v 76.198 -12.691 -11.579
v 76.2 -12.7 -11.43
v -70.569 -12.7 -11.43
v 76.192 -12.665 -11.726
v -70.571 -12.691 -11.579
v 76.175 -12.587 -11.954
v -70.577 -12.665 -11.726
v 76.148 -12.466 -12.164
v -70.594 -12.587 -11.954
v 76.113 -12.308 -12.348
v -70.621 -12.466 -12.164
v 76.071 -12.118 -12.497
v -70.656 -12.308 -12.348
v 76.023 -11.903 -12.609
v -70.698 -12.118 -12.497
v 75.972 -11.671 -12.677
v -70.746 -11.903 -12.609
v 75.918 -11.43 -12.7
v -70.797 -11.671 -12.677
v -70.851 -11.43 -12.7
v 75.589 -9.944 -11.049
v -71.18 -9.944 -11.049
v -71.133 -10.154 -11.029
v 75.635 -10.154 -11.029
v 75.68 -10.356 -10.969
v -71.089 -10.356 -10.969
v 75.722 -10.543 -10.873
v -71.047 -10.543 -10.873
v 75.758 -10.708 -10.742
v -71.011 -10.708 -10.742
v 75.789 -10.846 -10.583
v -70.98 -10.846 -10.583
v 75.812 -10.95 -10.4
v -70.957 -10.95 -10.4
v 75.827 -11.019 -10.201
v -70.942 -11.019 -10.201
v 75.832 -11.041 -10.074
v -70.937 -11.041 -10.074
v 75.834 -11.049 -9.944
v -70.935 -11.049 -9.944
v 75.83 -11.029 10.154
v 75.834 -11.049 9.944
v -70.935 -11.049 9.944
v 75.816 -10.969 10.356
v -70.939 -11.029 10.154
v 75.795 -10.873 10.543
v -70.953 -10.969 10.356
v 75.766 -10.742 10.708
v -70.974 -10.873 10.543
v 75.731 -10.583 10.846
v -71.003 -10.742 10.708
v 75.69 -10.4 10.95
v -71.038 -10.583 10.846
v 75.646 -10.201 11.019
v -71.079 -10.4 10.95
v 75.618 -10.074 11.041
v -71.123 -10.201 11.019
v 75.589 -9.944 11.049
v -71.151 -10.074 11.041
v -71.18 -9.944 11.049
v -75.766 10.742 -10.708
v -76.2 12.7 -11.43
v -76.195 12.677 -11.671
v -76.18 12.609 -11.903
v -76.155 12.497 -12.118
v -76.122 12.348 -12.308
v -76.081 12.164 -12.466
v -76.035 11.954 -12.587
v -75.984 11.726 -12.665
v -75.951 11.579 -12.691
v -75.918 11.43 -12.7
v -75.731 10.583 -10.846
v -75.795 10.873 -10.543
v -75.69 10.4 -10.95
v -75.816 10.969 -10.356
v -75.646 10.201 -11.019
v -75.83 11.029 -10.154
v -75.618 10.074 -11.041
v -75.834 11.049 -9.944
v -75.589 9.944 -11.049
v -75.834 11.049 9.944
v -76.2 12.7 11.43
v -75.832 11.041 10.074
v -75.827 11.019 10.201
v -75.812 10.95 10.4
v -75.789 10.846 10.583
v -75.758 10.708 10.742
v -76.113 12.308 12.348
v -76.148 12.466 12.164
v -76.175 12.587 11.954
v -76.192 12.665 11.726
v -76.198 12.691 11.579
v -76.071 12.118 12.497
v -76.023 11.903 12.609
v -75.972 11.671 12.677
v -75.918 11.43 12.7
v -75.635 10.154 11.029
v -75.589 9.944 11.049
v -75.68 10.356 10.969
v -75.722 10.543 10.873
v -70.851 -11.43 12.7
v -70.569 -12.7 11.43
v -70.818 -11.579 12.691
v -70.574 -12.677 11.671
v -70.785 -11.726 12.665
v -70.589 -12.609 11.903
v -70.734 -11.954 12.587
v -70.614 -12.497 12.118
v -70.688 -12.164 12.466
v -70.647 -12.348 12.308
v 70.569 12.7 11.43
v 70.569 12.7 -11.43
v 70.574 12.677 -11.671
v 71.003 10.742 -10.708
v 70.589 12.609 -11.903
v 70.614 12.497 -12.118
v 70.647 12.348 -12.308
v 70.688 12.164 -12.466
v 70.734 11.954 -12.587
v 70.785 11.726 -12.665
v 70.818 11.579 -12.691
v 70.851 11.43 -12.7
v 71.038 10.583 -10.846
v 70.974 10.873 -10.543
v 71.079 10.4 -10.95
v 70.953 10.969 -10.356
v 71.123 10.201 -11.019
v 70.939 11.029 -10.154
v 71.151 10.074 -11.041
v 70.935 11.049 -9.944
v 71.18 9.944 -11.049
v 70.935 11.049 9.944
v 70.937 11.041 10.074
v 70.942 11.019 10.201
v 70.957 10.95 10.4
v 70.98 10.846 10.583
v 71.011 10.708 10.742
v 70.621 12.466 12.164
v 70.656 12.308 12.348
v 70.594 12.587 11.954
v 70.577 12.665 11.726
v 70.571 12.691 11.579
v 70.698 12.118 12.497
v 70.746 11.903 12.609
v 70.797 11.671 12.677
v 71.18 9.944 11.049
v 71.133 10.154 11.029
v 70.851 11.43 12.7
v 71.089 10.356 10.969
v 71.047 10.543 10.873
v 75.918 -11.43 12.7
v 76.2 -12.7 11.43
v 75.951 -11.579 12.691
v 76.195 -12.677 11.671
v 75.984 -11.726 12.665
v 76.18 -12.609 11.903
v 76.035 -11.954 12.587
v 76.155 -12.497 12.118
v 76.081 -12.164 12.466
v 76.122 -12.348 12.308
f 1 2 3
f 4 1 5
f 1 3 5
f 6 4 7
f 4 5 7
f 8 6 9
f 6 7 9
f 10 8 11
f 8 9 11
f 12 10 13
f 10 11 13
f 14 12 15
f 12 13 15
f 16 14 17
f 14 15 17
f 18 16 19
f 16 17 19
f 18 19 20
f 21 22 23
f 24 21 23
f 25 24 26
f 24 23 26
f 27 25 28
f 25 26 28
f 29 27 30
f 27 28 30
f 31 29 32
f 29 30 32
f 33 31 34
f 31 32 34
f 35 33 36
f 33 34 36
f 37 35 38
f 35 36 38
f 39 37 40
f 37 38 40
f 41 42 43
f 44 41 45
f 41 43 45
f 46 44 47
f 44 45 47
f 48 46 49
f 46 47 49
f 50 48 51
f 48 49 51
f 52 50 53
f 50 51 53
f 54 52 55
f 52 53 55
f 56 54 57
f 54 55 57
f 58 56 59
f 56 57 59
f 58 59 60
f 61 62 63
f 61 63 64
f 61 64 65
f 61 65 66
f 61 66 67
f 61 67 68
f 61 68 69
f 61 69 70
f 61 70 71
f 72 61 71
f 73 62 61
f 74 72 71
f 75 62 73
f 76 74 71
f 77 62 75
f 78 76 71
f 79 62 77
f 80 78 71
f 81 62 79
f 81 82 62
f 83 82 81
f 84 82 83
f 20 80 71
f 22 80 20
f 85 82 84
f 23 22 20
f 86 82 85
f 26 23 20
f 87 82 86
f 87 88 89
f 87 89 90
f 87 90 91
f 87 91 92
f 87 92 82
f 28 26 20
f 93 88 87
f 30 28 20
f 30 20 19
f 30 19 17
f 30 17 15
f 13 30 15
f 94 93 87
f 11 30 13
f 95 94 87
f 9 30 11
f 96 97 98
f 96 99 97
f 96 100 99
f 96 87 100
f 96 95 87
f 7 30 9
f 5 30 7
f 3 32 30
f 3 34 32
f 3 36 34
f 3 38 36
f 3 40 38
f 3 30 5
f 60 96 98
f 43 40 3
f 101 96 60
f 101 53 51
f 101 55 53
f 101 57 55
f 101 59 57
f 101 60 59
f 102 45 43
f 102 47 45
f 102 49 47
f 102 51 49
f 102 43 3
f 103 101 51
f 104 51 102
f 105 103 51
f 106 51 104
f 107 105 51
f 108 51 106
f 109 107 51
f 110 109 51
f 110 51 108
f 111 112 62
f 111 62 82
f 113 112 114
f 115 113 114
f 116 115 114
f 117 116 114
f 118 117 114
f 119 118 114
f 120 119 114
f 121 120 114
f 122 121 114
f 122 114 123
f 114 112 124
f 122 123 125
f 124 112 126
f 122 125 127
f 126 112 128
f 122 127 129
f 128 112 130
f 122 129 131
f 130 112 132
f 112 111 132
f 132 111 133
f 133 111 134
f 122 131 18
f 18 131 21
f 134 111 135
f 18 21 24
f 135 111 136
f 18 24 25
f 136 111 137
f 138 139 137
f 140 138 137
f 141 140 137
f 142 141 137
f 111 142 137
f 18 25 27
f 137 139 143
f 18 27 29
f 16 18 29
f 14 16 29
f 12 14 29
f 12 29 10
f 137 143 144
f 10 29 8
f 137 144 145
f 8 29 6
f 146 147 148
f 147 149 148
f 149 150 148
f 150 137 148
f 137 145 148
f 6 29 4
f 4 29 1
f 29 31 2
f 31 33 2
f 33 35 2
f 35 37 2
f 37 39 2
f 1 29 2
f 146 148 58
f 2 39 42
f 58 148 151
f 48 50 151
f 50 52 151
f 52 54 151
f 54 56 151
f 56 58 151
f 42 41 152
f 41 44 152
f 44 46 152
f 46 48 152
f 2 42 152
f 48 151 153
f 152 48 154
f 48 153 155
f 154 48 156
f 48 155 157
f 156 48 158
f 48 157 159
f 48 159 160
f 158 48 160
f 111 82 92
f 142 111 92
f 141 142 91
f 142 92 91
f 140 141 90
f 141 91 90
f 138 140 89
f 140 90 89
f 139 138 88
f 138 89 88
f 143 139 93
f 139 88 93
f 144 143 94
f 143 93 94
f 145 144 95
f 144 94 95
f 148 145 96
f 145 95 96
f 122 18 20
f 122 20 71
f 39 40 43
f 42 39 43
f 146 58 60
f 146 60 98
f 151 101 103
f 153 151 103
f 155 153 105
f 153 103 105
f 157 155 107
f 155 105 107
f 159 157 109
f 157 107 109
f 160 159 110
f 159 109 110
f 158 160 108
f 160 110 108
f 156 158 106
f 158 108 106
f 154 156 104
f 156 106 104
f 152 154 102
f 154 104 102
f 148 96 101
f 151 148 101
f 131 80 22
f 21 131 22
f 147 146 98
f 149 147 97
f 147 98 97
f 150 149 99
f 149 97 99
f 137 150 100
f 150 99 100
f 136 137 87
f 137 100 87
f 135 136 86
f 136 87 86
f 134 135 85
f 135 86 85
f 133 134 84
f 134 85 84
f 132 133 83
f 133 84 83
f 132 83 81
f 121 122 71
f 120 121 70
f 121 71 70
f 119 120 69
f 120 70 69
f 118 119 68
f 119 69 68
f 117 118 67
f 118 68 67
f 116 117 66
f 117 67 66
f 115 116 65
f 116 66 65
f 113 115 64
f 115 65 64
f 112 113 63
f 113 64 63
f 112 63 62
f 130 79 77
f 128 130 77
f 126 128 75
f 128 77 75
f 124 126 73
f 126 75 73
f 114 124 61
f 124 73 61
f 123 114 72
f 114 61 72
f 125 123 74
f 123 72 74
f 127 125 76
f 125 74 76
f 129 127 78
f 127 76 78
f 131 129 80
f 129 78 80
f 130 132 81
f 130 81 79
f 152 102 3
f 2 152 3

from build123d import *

# Parameters (mm, degrees)
BOSS_EXTRUDE1_DEPTH      = 76.2
BOSS_EXTRUDE1_DEPTH_BACK = 76.2
CUT_EXTRUDE1_DEPTH       = 82.319677815


with BuildPart() as part:
    # Sketch4 → Boss-Extrude1 (new, two sides: drawn at the far end of the back side and taken through both)
    with BuildSketch(Plane(origin=(0, 0, 0), x_dir=(0, 0, -1), z_dir=(1, 0, 0)).offset(-BOSS_EXTRUDE1_DEPTH_BACK)):
        with BuildLine():
            Line((12.7, -11.43), (12.7, 11.43))
            ThreePointArc((12.7, 11.43), (12.328025612, 12.328025612), (11.43, 12.7))
            Line((11.43, 12.7), (-11.43, 12.7))
            ThreePointArc((-11.43, 12.7), (-12.328025612, 12.328025612), (-12.7, 11.43))
            Line((-12.7, 11.43), (-12.7, -11.43))
            ThreePointArc((-12.7, -11.43), (-12.328025612, -12.328025612), (-11.43, -12.7))
            Line((-11.43, -12.7), (11.43, -12.7))
            ThreePointArc((11.43, -12.7), (12.328025612, -12.328025612), (12.7, -11.43))
        make_face()
        with BuildLine():
            Line((11.049, 9.9441), (11.049, -9.9441))
            ThreePointArc((11.049, -9.9441), (10.725382283, -10.725382283), (9.9441, -11.049))
            Line((9.9441, -11.049), (-9.9441, -11.049))
            ThreePointArc((-9.9441, -11.049), (-10.725382283, -10.725382283), (-11.049, -9.9441))
            Line((-11.049, -9.9441), (-11.049, 9.9441))
            ThreePointArc((-11.049, 9.9441), (-10.725382283, 10.725382283), (-9.9441, 11.049))
            Line((-9.9441, 11.049), (9.9441, 11.049))
            ThreePointArc((9.9441, 11.049), (10.725382283, 10.725382283), (11.049, 9.9441))
        make_face(mode=Mode.SUBTRACT)
    extrude(amount=BOSS_EXTRUDE1_DEPTH + BOSS_EXTRUDE1_DEPTH_BACK)

    # Sketch5 → Cut-Extrude1 (cut, through all)
    with BuildSketch(Plane.XY.offset(12.7)):
        Polygon((76.2, -12.7), (76.2, 12.7), (70.568955569, 12.7), align=None)
        Polygon((-76.2, -12.7), (-76.2, 12.7), (-70.568955569, -12.7), align=None)
    extrude(amount=-CUT_EXTRUDE1_DEPTH, mode=Mode.SUBTRACT)


solid = part.part
